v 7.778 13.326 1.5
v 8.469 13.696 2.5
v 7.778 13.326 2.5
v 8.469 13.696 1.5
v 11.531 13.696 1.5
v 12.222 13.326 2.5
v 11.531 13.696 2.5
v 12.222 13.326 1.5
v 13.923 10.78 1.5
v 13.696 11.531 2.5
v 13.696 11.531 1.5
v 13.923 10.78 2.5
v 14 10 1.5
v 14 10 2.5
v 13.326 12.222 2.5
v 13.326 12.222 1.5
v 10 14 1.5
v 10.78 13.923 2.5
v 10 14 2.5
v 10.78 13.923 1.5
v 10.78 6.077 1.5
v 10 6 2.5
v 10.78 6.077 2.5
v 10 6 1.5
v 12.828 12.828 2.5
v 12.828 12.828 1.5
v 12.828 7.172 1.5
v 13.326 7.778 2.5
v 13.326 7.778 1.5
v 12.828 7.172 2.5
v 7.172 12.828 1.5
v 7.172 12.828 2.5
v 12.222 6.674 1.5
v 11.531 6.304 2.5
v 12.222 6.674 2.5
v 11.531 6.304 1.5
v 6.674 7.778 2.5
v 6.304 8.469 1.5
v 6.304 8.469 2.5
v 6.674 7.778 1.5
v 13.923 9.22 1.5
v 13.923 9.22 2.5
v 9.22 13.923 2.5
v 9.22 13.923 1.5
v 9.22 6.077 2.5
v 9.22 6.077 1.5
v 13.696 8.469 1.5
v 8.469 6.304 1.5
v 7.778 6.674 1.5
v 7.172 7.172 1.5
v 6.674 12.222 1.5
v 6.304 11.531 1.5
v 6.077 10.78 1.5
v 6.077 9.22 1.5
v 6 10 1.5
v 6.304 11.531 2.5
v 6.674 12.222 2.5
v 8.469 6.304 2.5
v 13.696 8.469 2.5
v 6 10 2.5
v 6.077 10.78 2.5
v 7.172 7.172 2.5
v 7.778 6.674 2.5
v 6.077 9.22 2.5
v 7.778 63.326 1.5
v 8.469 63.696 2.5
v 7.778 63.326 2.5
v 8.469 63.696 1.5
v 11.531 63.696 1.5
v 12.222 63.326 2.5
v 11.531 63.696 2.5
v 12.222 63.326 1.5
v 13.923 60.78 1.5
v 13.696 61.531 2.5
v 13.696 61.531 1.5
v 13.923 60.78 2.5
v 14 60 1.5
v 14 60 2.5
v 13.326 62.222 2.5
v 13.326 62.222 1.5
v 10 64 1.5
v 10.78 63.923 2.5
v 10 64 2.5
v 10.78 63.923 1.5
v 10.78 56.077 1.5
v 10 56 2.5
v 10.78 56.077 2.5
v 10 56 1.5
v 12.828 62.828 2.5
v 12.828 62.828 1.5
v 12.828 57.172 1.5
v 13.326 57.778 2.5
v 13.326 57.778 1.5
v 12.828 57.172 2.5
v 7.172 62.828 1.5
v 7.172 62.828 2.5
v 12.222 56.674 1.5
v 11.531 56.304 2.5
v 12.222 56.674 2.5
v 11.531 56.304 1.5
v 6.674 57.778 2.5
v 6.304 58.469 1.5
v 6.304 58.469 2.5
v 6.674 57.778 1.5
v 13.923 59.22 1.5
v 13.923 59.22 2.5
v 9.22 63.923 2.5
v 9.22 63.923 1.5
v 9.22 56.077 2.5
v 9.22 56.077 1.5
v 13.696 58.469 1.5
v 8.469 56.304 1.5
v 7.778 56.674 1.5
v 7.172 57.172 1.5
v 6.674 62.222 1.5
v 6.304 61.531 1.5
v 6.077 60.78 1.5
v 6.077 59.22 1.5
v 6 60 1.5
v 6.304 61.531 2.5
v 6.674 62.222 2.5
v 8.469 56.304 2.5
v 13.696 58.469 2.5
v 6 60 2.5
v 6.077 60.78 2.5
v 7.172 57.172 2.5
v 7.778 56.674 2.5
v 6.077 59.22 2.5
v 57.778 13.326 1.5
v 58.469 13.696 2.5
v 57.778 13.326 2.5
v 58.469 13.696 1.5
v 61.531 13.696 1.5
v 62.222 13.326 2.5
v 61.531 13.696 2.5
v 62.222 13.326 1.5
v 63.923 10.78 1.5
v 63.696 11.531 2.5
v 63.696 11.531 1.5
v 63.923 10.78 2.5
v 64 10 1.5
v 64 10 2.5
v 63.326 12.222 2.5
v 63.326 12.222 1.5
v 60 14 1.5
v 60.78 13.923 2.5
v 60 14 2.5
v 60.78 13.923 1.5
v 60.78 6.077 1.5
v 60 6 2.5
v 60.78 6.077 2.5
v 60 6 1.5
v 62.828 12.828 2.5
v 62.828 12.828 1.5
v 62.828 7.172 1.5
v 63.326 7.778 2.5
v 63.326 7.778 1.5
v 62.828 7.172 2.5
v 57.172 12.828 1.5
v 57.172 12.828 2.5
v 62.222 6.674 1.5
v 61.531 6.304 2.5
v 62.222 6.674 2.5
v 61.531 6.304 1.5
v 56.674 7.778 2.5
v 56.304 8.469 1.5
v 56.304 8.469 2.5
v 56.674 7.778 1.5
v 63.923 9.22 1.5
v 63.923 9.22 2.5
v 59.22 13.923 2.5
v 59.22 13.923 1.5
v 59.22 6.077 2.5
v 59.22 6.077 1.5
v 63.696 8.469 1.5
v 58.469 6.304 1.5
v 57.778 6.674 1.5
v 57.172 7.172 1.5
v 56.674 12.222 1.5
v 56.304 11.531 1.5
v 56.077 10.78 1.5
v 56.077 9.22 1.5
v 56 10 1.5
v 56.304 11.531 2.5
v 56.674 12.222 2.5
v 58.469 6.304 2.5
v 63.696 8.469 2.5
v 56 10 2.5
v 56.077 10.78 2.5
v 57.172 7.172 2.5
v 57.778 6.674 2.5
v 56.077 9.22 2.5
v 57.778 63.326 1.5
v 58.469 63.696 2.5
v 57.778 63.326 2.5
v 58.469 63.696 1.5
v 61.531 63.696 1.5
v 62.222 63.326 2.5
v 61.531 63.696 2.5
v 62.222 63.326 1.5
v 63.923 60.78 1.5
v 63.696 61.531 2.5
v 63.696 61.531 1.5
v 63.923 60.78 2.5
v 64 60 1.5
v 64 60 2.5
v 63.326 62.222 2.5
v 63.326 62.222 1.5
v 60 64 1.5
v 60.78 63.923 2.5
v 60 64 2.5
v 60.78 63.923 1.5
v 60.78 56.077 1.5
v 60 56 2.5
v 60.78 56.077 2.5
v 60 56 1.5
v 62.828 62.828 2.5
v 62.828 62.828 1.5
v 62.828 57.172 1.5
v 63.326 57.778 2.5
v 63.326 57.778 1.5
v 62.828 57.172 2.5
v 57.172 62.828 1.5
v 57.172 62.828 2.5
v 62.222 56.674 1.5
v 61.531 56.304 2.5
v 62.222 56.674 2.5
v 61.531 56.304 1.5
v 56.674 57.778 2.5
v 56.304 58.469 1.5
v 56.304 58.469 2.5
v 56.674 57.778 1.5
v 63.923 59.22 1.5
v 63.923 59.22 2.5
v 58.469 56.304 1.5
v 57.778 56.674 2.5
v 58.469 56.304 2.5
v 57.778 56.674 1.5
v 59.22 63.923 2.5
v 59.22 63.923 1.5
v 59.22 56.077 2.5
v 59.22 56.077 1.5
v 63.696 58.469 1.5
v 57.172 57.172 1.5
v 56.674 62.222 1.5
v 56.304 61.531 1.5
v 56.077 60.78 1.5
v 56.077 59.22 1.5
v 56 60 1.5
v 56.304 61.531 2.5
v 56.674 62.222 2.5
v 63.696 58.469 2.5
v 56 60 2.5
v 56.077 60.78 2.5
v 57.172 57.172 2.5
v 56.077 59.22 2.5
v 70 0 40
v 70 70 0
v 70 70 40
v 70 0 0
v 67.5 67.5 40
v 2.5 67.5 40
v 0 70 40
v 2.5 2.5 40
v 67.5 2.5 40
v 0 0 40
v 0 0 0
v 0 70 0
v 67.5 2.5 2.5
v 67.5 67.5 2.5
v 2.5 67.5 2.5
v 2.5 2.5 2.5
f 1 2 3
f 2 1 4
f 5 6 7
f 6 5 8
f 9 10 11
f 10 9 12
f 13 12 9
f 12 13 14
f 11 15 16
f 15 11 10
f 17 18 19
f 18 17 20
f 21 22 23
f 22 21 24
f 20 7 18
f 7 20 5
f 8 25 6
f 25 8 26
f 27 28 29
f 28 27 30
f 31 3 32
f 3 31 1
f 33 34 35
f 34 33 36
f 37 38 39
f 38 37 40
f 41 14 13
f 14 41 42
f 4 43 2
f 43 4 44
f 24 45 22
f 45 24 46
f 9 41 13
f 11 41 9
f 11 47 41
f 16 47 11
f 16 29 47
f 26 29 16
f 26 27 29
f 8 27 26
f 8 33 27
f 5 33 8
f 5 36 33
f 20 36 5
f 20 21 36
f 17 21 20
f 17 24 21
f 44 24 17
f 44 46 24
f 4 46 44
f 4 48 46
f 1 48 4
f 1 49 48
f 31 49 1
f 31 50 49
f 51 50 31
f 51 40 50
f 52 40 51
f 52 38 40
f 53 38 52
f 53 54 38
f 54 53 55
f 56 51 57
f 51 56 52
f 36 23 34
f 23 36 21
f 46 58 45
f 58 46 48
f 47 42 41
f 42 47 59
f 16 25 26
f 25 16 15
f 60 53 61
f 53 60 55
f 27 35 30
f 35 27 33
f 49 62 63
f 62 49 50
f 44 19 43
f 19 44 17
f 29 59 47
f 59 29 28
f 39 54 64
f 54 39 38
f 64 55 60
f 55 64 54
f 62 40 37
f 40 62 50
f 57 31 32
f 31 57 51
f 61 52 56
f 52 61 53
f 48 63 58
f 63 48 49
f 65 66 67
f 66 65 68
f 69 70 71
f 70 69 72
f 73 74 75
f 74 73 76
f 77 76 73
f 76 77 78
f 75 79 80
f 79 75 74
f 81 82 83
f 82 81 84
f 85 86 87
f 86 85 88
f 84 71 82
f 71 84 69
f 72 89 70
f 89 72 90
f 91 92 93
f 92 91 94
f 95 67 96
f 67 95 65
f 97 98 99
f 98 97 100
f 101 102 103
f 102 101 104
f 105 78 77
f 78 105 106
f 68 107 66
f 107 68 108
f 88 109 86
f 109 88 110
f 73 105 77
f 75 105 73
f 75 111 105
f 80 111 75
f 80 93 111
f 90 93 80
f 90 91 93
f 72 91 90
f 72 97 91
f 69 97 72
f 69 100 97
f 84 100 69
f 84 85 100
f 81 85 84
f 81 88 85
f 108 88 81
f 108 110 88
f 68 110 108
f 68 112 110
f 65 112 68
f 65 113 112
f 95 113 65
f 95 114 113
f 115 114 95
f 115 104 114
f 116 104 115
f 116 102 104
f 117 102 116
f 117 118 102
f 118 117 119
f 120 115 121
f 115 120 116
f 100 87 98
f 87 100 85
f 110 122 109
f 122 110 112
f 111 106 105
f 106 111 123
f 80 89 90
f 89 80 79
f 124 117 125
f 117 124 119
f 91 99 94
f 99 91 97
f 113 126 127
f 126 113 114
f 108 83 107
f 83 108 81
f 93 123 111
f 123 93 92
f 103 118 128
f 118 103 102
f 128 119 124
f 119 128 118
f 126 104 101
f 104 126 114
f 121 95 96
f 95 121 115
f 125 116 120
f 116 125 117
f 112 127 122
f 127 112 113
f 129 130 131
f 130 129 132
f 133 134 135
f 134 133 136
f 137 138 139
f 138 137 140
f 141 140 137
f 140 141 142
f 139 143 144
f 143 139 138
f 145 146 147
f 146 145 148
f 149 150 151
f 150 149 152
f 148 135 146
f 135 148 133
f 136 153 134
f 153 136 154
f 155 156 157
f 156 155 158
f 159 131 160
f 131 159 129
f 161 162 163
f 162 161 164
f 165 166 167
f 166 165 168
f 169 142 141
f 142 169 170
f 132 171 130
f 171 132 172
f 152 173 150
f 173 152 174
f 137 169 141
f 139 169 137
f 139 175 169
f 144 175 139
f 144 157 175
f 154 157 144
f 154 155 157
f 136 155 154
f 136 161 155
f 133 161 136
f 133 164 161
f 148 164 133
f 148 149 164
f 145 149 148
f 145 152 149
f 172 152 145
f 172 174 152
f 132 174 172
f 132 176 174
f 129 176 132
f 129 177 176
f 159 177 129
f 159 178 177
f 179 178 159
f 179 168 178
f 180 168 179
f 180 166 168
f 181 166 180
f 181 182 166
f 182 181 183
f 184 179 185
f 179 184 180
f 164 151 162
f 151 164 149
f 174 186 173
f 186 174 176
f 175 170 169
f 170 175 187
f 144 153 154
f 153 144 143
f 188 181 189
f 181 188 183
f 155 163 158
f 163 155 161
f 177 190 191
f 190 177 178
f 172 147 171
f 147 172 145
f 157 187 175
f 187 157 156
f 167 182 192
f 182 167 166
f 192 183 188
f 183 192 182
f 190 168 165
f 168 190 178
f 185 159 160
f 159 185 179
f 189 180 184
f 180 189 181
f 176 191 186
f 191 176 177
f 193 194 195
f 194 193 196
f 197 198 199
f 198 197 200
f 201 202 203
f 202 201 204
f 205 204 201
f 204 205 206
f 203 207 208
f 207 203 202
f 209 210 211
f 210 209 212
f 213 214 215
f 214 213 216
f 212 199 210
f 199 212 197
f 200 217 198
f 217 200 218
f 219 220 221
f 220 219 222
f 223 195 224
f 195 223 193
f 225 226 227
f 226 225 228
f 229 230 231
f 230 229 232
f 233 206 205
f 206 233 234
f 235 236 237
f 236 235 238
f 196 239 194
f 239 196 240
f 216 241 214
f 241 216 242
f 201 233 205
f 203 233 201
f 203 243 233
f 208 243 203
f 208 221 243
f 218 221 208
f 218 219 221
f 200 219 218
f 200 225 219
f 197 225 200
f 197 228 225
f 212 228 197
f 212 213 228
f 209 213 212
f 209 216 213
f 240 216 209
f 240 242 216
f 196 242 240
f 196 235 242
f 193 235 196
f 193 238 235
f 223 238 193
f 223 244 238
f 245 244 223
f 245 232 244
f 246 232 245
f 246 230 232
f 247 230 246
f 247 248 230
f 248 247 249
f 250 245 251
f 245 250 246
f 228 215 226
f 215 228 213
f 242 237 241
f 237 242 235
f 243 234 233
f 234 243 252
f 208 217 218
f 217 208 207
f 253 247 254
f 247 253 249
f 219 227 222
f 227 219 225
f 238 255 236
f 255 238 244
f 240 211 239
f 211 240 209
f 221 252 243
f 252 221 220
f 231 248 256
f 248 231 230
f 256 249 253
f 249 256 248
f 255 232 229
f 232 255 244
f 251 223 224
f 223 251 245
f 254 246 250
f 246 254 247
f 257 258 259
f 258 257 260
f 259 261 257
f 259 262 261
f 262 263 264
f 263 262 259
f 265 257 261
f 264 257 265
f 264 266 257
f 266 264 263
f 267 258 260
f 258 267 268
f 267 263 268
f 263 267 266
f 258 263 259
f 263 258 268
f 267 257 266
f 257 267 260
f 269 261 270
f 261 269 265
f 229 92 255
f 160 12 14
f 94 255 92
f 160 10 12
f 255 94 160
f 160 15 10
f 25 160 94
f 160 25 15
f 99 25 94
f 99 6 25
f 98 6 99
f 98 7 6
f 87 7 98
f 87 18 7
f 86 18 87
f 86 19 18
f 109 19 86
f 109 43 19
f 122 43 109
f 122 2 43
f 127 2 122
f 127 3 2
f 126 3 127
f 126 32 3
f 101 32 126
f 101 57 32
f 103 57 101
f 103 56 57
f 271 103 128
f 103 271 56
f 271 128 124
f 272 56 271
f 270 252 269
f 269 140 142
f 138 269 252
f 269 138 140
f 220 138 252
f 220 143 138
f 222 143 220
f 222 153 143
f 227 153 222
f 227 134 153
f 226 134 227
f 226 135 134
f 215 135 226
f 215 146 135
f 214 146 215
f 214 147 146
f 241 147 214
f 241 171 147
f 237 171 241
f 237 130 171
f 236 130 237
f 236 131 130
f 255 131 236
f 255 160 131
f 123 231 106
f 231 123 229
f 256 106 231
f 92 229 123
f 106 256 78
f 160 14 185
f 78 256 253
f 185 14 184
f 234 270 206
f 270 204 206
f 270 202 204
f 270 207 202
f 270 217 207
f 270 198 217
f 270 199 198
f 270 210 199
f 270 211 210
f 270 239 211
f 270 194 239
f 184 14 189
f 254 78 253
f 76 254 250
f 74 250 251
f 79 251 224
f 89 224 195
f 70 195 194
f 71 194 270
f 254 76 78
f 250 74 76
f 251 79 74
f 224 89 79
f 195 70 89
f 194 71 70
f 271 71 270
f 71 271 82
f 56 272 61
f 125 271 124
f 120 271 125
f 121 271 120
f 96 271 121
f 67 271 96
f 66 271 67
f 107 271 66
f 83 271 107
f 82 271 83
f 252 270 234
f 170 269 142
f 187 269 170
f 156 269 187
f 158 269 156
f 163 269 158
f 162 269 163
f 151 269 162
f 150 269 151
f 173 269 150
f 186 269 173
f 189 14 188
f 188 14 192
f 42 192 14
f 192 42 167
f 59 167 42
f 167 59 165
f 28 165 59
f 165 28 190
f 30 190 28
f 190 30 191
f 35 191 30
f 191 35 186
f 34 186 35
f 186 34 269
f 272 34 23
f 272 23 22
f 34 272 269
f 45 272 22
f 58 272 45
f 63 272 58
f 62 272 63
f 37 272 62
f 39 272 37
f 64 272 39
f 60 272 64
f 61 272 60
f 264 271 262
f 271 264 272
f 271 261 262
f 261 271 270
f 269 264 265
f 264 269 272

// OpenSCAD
$fn = 32;

// ----------------------------------------------------------------------
// Enclosure box: bosses enclosure
// ----------------------------------------------------------------------

// --- parameters (mm) ---
box_l = 70;               // outer length, X
box_w = 70;               // outer width, Y
box_h = 40;               // outer height
wall_t = 2.5;             // wall thickness
boss_r = 4;               // corner boss radius
hole_r = 1.5;             // boss screw hole radius
boss_in = 10;             // boss inset from the corners

inner_h = box_h - wall_t;  // cavity depth
boss_h = inner_h - 2;  // corner boss height

difference() {
  cube([box_l, box_w, box_h]);
  translate([wall_t, wall_t, wall_t])
    cube([box_l - 2 * wall_t, box_w - 2 * wall_t, box_h]);
  for (sx = [0, 1], sy = [0, 1])
    translate([sx ? box_l - boss_in : boss_in,
               sy ? box_w - boss_in : boss_in, wall_t - 1]) {
      cylinder(r = boss_r, h = boss_h);
      translate([0, 0, boss_h - 4])
        cylinder(r = hole_r, h = 5);
    }
}
